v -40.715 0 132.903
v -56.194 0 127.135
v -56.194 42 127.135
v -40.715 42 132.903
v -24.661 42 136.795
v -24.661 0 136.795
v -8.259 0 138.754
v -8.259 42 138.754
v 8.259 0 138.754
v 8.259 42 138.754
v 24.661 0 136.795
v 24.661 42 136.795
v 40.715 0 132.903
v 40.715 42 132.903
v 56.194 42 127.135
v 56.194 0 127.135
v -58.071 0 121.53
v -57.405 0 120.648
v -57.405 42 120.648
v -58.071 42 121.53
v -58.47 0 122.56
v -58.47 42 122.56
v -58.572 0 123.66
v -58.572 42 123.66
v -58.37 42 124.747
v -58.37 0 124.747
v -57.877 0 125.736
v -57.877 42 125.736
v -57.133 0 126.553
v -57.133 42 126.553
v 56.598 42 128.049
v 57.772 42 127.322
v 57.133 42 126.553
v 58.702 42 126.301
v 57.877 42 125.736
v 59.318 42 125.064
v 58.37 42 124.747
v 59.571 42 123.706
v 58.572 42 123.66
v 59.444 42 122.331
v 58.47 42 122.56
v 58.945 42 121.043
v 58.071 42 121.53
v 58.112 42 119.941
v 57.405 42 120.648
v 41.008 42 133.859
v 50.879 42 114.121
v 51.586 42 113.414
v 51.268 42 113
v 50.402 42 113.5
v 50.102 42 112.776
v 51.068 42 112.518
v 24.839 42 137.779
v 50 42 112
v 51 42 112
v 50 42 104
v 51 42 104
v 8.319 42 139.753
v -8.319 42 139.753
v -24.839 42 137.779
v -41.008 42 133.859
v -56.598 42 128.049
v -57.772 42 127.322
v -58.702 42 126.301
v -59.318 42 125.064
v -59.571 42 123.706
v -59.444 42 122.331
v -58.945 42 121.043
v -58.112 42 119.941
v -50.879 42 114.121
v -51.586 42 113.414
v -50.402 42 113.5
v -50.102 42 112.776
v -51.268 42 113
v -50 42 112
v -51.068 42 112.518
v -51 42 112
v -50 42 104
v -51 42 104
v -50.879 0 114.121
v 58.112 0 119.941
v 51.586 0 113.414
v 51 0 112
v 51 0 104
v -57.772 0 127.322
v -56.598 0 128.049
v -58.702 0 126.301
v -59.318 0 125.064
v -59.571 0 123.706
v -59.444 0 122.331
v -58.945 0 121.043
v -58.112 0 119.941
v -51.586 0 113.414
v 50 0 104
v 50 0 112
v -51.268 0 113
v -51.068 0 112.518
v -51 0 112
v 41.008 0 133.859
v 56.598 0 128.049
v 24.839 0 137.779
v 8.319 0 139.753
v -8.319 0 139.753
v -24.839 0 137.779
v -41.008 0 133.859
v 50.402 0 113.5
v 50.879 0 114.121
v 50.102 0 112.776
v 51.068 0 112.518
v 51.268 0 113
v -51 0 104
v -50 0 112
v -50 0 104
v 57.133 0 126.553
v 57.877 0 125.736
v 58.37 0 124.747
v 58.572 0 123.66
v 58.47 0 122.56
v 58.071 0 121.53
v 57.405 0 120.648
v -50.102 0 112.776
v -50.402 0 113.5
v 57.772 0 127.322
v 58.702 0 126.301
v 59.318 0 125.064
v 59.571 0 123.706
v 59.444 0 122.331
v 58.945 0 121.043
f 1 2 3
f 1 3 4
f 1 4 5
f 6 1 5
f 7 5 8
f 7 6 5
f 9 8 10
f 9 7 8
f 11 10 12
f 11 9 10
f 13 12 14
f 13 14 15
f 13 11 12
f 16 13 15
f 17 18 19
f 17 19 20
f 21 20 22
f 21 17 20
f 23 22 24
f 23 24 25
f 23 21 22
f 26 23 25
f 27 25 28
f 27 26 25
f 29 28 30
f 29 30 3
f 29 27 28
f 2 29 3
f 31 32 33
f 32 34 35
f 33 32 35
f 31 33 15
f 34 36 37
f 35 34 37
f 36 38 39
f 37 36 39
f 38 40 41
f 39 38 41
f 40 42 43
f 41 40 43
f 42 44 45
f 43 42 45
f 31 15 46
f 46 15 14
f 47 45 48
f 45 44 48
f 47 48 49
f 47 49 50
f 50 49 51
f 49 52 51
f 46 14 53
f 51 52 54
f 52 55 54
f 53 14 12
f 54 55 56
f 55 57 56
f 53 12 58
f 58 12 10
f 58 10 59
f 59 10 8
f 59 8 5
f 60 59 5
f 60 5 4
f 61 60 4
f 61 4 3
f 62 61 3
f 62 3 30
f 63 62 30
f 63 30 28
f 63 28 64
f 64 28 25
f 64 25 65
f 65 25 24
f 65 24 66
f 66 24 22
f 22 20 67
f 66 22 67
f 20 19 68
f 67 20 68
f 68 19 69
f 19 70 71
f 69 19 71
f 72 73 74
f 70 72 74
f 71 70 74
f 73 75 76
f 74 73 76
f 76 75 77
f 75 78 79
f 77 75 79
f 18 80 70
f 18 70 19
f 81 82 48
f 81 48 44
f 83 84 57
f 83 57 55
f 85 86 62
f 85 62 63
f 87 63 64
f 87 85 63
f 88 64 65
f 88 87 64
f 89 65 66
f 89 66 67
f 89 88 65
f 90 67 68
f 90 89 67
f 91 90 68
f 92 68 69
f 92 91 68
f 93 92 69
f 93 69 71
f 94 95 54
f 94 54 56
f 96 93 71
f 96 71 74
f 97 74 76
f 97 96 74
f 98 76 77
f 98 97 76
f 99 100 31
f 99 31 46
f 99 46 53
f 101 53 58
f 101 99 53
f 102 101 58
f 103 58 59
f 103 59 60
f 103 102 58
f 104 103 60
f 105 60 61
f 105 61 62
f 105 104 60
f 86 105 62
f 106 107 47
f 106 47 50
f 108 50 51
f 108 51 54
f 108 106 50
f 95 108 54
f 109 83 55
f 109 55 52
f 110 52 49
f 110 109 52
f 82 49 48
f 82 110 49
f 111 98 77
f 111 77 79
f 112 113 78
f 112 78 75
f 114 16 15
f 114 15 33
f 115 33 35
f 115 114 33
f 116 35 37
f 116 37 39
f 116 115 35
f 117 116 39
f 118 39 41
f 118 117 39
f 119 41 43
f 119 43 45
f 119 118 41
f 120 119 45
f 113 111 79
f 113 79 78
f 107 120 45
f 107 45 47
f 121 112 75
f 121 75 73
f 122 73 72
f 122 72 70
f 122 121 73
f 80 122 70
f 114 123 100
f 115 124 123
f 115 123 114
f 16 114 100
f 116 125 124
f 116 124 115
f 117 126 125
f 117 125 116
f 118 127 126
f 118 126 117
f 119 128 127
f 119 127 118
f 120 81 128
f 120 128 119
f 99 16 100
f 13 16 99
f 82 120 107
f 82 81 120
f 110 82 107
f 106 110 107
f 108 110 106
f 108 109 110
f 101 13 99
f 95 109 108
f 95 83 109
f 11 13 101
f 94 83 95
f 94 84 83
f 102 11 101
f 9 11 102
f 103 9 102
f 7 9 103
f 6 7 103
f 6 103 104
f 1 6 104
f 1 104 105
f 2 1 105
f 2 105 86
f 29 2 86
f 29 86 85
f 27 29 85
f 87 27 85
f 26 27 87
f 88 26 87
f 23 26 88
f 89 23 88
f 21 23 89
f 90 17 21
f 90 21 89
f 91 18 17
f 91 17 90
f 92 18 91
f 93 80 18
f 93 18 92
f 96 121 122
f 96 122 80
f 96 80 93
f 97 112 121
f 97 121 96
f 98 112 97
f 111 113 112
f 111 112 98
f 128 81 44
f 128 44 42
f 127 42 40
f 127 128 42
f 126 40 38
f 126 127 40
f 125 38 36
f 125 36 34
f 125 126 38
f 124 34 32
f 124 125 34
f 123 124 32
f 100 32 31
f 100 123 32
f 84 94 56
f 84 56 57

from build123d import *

# Parameters (mm, degrees)
BOSS_EXTRUDE1_DEPTH = 42


with BuildPart() as part:
    # Sketch1 → Boss-Extrude1 (new body)
    with BuildSketch(Plane(origin=(0, 0, 0), x_dir=(1, 0, 0), z_dir=(0, 1, 0))):
        with BuildLine():
            Line((-58.112270696, -119.940697821), (-51.585786438, -113.414213562))
            ThreePointArc((-51.585786438, -113.414213562), (-51.152240935, -112.765366865), (-51, -112))
            Line((-51, -112), (-51, -104))
            Line((-51, -104), (-50, -104))
            Line((-50, -104), (-50, -112))
            ThreePointArc((-50, -112), (-50.228361402, -113.148050297), (-50.878679656, -114.121320344))
            Line((-50.878679656, -114.121320344), (-57.405163915, -120.647804602))
            ThreePointArc((-57.405163915, -120.647804602), (-58.508770183, -124.210475144), (-56.193825287, -127.134786741))
            ThreePointArc((-56.193825287, -127.134786741), (0, -139), (56.193825287, -127.134786741))
            ThreePointArc((56.193825287, -127.134786741), (58.508770183, -124.210475144), (57.405163915, -120.647804602))
            Line((57.405163915, -120.647804602), (50.878679656, -114.121320344))
            ThreePointArc((50.878679656, -114.121320344), (50.228361402, -113.148050297), (50, -112))
            Line((50, -112), (50, -104))
            Line((50, -104), (51, -104))
            Line((51, -104), (51, -112))
            ThreePointArc((51, -112), (51.152240935, -112.765366865), (51.585786438, -113.414213562))
            Line((51.585786438, -113.414213562), (58.112270696, -119.940697821))
            ThreePointArc((58.112270696, -119.940697821), (59.491778531, -124.394035998), (56.598097412, -128.049425494))
            ThreePointArc((56.598097412, -128.049425494), (0, -140), (-56.598097412, -128.049425494))
            ThreePointArc((-56.598097412, -128.049425494), (-59.491778531, -124.394035998), (-58.112270696, -119.940697821))
        make_face()
    extrude(amount=BOSS_EXTRUDE1_DEPTH)


solid = part.part
